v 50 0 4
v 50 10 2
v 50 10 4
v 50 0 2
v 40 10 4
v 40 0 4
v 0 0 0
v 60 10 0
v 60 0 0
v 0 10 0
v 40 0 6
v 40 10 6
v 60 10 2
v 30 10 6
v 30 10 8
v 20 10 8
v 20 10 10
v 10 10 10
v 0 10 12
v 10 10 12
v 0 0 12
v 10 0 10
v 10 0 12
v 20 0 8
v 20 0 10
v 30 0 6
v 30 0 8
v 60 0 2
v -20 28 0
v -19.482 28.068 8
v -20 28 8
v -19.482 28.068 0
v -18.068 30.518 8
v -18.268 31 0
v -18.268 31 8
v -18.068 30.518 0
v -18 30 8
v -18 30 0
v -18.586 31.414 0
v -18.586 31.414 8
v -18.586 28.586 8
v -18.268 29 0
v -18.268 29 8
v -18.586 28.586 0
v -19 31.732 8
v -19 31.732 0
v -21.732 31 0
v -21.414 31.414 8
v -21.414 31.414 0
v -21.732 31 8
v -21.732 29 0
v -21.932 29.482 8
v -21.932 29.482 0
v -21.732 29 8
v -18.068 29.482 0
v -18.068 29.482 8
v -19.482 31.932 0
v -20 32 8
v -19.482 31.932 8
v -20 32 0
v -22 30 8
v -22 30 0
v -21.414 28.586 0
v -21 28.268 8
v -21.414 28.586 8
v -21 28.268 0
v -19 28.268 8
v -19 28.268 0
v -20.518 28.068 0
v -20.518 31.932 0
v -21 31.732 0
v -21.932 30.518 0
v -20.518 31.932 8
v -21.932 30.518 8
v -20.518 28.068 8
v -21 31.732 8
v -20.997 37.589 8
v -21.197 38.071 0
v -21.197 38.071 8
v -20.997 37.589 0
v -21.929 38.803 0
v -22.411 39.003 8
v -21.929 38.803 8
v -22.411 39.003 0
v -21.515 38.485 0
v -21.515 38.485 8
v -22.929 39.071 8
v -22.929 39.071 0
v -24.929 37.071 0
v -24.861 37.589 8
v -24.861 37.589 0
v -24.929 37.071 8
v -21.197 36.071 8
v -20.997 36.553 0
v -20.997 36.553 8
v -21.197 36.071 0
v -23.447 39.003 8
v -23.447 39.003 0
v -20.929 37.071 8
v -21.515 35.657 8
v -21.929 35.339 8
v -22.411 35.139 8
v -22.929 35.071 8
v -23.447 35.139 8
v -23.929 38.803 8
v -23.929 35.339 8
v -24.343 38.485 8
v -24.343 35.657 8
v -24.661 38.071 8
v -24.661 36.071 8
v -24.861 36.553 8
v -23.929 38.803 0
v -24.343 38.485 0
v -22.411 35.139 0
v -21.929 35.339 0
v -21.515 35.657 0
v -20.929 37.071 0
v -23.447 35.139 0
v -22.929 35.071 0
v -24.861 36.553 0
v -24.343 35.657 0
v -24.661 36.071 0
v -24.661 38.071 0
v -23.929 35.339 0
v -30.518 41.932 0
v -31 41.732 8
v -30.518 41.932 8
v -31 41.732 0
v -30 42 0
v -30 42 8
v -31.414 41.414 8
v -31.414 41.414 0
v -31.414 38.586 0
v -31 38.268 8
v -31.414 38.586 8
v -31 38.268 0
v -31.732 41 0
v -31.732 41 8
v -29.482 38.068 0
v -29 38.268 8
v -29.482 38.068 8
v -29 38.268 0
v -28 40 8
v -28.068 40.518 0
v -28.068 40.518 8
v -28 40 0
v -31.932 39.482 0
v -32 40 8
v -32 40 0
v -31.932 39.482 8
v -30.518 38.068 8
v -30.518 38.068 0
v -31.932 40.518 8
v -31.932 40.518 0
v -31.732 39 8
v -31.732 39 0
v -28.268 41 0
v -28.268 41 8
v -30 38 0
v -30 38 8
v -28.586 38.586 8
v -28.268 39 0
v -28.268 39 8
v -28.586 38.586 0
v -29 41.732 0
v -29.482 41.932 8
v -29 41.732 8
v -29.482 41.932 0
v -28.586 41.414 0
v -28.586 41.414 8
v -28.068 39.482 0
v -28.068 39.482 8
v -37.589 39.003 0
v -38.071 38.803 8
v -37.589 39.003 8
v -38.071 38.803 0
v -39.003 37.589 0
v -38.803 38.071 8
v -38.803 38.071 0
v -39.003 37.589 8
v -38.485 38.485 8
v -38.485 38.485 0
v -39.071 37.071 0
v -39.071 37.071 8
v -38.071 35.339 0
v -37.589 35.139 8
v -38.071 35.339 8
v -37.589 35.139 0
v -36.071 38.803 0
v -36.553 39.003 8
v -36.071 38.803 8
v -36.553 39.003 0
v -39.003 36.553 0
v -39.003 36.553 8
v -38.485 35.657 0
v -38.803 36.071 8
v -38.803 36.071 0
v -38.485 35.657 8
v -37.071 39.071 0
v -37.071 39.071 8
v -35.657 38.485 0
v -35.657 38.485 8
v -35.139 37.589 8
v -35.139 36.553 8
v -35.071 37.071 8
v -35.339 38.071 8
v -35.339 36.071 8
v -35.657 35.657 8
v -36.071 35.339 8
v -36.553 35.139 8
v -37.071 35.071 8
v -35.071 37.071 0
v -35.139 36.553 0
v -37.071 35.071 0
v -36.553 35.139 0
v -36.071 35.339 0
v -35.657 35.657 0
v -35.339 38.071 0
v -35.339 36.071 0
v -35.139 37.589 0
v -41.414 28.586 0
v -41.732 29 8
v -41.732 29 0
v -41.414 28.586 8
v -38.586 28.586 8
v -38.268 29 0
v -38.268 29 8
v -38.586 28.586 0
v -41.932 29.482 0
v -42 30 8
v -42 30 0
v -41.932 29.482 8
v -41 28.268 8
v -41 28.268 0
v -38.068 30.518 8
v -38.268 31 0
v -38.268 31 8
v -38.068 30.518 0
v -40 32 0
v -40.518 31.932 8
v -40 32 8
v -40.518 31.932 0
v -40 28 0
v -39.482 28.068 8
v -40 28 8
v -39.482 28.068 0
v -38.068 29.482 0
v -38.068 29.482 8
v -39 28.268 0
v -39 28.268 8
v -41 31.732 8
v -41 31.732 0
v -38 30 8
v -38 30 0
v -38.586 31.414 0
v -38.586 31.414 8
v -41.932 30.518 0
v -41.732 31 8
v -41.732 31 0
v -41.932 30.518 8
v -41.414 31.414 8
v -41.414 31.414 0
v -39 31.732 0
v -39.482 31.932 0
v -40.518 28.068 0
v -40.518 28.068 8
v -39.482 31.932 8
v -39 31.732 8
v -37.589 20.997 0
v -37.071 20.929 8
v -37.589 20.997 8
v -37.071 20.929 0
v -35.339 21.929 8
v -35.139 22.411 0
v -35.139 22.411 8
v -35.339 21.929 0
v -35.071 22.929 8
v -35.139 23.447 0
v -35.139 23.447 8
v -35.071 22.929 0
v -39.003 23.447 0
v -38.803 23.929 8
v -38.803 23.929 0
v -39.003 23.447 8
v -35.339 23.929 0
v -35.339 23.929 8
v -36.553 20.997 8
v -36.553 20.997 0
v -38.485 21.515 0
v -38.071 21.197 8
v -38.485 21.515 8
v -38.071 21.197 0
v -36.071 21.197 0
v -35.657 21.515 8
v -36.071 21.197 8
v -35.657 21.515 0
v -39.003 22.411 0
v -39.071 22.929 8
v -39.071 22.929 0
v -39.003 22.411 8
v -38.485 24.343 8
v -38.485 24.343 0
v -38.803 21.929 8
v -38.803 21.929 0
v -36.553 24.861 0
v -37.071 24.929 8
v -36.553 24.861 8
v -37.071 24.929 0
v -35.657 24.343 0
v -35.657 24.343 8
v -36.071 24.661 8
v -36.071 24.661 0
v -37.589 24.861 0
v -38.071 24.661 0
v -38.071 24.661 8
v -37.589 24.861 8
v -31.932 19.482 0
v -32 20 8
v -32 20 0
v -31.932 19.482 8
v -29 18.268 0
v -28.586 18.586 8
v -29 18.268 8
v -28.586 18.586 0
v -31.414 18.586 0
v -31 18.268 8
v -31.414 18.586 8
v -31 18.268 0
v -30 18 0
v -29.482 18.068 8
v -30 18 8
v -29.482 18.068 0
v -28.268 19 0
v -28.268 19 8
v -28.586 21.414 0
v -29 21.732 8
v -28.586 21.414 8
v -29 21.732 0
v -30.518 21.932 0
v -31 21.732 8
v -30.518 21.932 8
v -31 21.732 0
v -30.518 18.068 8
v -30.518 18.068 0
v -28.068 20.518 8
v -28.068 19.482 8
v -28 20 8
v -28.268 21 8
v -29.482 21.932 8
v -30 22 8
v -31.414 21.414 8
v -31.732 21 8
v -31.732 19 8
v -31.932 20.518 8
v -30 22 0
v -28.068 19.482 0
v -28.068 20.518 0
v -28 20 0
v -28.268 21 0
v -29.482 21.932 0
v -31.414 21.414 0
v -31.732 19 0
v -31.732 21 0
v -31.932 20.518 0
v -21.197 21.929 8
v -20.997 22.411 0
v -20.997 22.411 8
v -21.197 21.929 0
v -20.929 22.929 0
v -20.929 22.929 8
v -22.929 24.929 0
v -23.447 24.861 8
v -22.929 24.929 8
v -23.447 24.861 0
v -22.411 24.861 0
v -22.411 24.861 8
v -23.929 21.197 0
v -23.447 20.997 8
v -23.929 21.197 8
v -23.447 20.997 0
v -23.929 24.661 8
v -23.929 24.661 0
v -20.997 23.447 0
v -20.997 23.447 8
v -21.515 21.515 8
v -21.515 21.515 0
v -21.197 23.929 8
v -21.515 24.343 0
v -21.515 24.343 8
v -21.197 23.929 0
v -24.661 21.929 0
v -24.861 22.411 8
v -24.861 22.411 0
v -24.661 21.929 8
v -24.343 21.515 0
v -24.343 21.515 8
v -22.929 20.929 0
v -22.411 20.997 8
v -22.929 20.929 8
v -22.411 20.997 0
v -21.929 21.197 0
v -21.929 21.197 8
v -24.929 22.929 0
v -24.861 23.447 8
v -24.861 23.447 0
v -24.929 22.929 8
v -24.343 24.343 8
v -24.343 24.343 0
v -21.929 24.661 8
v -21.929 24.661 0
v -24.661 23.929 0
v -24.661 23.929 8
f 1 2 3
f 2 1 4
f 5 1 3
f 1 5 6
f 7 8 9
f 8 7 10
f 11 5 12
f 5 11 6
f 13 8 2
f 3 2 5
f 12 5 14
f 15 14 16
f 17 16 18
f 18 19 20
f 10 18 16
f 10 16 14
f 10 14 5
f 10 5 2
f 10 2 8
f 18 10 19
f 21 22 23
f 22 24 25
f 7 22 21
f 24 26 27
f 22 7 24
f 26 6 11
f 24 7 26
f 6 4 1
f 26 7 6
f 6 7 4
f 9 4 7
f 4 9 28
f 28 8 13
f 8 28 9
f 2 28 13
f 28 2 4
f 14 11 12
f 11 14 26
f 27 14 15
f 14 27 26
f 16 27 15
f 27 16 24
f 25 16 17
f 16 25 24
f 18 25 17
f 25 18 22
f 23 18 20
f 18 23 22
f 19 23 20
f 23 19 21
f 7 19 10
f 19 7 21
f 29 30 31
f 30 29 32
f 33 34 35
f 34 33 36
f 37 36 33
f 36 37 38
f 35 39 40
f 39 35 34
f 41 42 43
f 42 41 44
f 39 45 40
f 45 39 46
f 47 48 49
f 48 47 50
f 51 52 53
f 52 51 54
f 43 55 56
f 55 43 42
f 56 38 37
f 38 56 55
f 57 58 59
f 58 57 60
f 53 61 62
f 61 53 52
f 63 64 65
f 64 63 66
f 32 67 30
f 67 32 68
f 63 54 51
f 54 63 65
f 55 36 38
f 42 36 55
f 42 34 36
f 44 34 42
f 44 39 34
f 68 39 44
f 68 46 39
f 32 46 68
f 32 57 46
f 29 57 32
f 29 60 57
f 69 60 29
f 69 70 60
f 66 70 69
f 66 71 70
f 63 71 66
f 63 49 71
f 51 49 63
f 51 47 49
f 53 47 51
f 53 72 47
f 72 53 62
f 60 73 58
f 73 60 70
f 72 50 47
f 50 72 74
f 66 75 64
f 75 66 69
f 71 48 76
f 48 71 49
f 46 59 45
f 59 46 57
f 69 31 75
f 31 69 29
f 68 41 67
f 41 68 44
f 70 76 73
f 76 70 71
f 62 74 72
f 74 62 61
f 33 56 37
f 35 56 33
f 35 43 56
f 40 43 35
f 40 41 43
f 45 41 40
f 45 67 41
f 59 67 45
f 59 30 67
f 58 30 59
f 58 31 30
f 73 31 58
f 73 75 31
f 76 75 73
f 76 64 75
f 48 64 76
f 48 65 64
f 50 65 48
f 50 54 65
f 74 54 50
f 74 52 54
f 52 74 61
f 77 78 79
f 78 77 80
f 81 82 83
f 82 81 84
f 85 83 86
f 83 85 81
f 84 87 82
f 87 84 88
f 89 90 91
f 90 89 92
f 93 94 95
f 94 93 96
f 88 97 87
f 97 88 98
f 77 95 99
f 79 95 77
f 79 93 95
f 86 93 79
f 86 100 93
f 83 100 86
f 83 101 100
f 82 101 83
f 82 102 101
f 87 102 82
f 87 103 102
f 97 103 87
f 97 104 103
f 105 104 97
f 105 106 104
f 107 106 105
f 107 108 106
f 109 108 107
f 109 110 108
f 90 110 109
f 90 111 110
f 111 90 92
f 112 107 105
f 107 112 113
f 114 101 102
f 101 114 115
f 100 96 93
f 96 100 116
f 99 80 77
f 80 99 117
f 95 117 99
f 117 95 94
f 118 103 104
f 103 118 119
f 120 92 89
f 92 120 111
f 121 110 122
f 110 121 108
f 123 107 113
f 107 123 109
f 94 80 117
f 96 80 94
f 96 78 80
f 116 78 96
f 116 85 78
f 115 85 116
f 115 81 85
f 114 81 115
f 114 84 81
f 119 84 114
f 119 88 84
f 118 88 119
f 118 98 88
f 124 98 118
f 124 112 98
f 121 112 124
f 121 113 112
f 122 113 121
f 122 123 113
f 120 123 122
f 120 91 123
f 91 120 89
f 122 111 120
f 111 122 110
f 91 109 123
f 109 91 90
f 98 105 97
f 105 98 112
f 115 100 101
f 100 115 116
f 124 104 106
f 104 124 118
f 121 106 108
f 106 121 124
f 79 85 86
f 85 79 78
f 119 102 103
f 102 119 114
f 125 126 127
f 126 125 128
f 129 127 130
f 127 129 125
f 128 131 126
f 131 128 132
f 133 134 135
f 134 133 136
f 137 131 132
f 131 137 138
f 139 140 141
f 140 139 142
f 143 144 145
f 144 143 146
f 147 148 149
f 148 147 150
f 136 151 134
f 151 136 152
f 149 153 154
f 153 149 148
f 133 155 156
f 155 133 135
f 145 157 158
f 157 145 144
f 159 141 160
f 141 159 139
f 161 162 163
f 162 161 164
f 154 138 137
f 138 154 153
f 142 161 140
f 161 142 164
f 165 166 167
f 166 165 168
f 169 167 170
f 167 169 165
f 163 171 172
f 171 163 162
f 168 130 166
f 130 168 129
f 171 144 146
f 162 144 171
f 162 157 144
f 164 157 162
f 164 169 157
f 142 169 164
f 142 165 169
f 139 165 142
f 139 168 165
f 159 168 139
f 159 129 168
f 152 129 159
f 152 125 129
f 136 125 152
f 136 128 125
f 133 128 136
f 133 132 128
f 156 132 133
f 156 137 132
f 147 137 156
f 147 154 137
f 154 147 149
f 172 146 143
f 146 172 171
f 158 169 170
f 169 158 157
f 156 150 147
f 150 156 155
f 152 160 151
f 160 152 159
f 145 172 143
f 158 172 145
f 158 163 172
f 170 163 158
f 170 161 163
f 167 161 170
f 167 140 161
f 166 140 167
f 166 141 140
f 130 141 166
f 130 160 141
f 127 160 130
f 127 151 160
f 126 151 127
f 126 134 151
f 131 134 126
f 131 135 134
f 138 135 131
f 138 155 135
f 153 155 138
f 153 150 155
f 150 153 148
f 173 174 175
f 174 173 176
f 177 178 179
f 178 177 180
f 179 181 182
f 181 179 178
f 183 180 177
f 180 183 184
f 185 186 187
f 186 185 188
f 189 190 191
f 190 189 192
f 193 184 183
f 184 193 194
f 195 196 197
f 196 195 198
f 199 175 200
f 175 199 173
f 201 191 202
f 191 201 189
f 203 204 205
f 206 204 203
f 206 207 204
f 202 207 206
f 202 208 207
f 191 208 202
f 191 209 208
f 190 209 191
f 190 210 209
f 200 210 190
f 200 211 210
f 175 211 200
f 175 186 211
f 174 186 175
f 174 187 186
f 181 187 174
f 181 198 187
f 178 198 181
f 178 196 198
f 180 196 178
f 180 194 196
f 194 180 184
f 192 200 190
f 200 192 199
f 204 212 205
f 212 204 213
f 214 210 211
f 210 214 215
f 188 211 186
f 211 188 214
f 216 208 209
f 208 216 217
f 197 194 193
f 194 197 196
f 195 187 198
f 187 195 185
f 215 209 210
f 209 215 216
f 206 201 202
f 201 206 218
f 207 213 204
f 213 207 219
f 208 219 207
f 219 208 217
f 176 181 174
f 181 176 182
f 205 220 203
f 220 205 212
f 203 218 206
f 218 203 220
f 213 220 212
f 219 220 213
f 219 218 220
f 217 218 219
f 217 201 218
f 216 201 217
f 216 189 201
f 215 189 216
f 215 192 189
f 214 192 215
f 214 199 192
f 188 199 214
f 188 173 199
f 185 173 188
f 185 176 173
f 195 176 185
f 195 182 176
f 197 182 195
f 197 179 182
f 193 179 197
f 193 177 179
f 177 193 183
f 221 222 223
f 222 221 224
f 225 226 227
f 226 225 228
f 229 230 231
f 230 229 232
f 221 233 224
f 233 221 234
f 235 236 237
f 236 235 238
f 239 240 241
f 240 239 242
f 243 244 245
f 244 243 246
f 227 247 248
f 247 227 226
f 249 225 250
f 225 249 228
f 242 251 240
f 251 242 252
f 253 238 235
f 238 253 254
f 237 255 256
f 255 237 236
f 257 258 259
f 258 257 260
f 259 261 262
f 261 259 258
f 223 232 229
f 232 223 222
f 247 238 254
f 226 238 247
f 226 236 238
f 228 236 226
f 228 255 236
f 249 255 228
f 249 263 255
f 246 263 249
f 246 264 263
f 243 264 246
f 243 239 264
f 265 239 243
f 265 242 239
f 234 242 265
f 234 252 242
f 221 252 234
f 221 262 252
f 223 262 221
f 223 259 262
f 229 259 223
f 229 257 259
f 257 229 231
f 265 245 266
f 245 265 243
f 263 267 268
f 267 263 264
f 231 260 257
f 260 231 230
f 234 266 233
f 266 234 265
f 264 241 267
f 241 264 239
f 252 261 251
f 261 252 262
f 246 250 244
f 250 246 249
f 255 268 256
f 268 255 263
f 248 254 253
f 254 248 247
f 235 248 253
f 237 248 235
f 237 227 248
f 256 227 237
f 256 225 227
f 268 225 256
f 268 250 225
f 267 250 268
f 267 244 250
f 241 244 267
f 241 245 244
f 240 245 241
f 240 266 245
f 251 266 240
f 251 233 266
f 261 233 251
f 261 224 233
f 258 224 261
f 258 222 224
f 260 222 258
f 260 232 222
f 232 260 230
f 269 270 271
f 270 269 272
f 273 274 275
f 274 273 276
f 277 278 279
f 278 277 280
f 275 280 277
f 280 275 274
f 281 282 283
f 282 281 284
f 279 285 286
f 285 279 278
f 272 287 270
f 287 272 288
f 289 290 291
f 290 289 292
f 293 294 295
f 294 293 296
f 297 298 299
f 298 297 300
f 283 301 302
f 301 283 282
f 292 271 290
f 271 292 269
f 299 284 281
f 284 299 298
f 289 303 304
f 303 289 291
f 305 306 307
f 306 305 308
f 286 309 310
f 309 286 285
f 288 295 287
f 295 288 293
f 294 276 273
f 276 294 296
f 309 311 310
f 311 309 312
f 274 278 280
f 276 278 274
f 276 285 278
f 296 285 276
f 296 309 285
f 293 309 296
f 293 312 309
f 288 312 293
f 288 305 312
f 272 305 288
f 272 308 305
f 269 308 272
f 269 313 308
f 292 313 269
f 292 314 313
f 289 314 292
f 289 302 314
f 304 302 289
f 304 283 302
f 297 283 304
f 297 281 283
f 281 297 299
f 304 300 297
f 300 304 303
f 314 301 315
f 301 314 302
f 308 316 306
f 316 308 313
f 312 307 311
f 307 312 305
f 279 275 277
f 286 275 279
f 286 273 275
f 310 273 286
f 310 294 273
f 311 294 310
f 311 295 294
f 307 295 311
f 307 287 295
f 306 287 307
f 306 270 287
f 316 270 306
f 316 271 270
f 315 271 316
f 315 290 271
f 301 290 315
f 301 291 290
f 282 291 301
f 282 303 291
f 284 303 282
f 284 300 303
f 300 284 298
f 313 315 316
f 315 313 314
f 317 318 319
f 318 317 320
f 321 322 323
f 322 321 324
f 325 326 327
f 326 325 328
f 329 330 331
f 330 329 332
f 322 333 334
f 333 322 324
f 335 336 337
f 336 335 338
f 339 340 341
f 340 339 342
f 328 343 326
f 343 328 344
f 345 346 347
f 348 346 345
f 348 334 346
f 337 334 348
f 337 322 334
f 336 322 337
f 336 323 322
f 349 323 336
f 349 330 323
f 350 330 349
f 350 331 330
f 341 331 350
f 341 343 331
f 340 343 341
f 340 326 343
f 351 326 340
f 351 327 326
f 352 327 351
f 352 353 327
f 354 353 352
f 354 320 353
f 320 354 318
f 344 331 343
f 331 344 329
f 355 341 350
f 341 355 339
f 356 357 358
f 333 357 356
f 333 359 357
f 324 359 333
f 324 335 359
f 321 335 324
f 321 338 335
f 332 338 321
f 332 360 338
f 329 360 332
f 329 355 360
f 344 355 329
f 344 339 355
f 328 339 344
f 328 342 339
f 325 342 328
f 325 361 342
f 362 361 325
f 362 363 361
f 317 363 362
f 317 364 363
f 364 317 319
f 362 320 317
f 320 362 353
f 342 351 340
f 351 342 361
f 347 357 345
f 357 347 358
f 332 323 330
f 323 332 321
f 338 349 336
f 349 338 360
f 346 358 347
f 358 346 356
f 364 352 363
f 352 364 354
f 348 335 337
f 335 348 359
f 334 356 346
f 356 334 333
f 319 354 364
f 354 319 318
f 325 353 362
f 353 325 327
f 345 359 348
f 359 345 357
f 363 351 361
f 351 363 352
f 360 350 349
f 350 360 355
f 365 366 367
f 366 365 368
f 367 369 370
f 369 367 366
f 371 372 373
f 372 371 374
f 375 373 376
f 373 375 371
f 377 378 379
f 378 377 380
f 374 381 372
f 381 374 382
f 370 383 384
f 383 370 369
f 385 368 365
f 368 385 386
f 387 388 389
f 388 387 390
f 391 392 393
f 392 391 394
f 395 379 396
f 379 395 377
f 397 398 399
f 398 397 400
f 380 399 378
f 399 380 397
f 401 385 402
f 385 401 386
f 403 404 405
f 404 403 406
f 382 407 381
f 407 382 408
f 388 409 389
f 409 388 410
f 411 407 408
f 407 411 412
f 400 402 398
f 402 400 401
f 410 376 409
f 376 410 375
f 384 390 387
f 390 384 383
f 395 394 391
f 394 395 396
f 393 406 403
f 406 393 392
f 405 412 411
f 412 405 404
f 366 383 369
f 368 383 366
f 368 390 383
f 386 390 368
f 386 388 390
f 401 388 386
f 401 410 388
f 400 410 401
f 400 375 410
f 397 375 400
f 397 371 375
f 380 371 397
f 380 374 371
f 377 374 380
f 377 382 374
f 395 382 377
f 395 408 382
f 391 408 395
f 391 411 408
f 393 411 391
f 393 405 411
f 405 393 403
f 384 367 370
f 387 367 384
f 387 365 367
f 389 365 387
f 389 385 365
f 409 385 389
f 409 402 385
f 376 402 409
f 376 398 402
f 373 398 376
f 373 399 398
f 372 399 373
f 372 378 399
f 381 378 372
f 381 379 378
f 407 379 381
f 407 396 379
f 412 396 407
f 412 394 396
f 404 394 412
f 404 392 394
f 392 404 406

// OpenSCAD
// Original CanvasNet test fixture: a scene generated by modules, recursion, loops and children.

// A staircase built by recursion: n steps of width w, each rise higher than the next, along +X
module steps(n, w = 10, rise = 2) {
  if (n > 0) {
    cube([w, 10, rise * n]);
    translate([w, 0, 0]) steps(n - 1, w, rise);
  }
}

// Places a copy of its child on a circle of the given radius, count times
module around(count, radius) {
  for (i = [0 : count - 1])
    rotate([0, 0, i * 360 / count]) translate([radius, 0, 0]) children();
}

// A module that paints whatever it is given
module painted(name) {
  color(name) children();
}

// Six steps covering x 0..60, y 0..10 with heights 12, 10, 8, 6, 4, 2
painted("gray") steps(6);

// Eight posts of radius 2 and height 8 on a circle of radius 10 around (-30, 30)
translate([-30, 30, 0]) painted("sienna") around(8, 10) cylinder(r = 2, h = 8, $fn = 24);
